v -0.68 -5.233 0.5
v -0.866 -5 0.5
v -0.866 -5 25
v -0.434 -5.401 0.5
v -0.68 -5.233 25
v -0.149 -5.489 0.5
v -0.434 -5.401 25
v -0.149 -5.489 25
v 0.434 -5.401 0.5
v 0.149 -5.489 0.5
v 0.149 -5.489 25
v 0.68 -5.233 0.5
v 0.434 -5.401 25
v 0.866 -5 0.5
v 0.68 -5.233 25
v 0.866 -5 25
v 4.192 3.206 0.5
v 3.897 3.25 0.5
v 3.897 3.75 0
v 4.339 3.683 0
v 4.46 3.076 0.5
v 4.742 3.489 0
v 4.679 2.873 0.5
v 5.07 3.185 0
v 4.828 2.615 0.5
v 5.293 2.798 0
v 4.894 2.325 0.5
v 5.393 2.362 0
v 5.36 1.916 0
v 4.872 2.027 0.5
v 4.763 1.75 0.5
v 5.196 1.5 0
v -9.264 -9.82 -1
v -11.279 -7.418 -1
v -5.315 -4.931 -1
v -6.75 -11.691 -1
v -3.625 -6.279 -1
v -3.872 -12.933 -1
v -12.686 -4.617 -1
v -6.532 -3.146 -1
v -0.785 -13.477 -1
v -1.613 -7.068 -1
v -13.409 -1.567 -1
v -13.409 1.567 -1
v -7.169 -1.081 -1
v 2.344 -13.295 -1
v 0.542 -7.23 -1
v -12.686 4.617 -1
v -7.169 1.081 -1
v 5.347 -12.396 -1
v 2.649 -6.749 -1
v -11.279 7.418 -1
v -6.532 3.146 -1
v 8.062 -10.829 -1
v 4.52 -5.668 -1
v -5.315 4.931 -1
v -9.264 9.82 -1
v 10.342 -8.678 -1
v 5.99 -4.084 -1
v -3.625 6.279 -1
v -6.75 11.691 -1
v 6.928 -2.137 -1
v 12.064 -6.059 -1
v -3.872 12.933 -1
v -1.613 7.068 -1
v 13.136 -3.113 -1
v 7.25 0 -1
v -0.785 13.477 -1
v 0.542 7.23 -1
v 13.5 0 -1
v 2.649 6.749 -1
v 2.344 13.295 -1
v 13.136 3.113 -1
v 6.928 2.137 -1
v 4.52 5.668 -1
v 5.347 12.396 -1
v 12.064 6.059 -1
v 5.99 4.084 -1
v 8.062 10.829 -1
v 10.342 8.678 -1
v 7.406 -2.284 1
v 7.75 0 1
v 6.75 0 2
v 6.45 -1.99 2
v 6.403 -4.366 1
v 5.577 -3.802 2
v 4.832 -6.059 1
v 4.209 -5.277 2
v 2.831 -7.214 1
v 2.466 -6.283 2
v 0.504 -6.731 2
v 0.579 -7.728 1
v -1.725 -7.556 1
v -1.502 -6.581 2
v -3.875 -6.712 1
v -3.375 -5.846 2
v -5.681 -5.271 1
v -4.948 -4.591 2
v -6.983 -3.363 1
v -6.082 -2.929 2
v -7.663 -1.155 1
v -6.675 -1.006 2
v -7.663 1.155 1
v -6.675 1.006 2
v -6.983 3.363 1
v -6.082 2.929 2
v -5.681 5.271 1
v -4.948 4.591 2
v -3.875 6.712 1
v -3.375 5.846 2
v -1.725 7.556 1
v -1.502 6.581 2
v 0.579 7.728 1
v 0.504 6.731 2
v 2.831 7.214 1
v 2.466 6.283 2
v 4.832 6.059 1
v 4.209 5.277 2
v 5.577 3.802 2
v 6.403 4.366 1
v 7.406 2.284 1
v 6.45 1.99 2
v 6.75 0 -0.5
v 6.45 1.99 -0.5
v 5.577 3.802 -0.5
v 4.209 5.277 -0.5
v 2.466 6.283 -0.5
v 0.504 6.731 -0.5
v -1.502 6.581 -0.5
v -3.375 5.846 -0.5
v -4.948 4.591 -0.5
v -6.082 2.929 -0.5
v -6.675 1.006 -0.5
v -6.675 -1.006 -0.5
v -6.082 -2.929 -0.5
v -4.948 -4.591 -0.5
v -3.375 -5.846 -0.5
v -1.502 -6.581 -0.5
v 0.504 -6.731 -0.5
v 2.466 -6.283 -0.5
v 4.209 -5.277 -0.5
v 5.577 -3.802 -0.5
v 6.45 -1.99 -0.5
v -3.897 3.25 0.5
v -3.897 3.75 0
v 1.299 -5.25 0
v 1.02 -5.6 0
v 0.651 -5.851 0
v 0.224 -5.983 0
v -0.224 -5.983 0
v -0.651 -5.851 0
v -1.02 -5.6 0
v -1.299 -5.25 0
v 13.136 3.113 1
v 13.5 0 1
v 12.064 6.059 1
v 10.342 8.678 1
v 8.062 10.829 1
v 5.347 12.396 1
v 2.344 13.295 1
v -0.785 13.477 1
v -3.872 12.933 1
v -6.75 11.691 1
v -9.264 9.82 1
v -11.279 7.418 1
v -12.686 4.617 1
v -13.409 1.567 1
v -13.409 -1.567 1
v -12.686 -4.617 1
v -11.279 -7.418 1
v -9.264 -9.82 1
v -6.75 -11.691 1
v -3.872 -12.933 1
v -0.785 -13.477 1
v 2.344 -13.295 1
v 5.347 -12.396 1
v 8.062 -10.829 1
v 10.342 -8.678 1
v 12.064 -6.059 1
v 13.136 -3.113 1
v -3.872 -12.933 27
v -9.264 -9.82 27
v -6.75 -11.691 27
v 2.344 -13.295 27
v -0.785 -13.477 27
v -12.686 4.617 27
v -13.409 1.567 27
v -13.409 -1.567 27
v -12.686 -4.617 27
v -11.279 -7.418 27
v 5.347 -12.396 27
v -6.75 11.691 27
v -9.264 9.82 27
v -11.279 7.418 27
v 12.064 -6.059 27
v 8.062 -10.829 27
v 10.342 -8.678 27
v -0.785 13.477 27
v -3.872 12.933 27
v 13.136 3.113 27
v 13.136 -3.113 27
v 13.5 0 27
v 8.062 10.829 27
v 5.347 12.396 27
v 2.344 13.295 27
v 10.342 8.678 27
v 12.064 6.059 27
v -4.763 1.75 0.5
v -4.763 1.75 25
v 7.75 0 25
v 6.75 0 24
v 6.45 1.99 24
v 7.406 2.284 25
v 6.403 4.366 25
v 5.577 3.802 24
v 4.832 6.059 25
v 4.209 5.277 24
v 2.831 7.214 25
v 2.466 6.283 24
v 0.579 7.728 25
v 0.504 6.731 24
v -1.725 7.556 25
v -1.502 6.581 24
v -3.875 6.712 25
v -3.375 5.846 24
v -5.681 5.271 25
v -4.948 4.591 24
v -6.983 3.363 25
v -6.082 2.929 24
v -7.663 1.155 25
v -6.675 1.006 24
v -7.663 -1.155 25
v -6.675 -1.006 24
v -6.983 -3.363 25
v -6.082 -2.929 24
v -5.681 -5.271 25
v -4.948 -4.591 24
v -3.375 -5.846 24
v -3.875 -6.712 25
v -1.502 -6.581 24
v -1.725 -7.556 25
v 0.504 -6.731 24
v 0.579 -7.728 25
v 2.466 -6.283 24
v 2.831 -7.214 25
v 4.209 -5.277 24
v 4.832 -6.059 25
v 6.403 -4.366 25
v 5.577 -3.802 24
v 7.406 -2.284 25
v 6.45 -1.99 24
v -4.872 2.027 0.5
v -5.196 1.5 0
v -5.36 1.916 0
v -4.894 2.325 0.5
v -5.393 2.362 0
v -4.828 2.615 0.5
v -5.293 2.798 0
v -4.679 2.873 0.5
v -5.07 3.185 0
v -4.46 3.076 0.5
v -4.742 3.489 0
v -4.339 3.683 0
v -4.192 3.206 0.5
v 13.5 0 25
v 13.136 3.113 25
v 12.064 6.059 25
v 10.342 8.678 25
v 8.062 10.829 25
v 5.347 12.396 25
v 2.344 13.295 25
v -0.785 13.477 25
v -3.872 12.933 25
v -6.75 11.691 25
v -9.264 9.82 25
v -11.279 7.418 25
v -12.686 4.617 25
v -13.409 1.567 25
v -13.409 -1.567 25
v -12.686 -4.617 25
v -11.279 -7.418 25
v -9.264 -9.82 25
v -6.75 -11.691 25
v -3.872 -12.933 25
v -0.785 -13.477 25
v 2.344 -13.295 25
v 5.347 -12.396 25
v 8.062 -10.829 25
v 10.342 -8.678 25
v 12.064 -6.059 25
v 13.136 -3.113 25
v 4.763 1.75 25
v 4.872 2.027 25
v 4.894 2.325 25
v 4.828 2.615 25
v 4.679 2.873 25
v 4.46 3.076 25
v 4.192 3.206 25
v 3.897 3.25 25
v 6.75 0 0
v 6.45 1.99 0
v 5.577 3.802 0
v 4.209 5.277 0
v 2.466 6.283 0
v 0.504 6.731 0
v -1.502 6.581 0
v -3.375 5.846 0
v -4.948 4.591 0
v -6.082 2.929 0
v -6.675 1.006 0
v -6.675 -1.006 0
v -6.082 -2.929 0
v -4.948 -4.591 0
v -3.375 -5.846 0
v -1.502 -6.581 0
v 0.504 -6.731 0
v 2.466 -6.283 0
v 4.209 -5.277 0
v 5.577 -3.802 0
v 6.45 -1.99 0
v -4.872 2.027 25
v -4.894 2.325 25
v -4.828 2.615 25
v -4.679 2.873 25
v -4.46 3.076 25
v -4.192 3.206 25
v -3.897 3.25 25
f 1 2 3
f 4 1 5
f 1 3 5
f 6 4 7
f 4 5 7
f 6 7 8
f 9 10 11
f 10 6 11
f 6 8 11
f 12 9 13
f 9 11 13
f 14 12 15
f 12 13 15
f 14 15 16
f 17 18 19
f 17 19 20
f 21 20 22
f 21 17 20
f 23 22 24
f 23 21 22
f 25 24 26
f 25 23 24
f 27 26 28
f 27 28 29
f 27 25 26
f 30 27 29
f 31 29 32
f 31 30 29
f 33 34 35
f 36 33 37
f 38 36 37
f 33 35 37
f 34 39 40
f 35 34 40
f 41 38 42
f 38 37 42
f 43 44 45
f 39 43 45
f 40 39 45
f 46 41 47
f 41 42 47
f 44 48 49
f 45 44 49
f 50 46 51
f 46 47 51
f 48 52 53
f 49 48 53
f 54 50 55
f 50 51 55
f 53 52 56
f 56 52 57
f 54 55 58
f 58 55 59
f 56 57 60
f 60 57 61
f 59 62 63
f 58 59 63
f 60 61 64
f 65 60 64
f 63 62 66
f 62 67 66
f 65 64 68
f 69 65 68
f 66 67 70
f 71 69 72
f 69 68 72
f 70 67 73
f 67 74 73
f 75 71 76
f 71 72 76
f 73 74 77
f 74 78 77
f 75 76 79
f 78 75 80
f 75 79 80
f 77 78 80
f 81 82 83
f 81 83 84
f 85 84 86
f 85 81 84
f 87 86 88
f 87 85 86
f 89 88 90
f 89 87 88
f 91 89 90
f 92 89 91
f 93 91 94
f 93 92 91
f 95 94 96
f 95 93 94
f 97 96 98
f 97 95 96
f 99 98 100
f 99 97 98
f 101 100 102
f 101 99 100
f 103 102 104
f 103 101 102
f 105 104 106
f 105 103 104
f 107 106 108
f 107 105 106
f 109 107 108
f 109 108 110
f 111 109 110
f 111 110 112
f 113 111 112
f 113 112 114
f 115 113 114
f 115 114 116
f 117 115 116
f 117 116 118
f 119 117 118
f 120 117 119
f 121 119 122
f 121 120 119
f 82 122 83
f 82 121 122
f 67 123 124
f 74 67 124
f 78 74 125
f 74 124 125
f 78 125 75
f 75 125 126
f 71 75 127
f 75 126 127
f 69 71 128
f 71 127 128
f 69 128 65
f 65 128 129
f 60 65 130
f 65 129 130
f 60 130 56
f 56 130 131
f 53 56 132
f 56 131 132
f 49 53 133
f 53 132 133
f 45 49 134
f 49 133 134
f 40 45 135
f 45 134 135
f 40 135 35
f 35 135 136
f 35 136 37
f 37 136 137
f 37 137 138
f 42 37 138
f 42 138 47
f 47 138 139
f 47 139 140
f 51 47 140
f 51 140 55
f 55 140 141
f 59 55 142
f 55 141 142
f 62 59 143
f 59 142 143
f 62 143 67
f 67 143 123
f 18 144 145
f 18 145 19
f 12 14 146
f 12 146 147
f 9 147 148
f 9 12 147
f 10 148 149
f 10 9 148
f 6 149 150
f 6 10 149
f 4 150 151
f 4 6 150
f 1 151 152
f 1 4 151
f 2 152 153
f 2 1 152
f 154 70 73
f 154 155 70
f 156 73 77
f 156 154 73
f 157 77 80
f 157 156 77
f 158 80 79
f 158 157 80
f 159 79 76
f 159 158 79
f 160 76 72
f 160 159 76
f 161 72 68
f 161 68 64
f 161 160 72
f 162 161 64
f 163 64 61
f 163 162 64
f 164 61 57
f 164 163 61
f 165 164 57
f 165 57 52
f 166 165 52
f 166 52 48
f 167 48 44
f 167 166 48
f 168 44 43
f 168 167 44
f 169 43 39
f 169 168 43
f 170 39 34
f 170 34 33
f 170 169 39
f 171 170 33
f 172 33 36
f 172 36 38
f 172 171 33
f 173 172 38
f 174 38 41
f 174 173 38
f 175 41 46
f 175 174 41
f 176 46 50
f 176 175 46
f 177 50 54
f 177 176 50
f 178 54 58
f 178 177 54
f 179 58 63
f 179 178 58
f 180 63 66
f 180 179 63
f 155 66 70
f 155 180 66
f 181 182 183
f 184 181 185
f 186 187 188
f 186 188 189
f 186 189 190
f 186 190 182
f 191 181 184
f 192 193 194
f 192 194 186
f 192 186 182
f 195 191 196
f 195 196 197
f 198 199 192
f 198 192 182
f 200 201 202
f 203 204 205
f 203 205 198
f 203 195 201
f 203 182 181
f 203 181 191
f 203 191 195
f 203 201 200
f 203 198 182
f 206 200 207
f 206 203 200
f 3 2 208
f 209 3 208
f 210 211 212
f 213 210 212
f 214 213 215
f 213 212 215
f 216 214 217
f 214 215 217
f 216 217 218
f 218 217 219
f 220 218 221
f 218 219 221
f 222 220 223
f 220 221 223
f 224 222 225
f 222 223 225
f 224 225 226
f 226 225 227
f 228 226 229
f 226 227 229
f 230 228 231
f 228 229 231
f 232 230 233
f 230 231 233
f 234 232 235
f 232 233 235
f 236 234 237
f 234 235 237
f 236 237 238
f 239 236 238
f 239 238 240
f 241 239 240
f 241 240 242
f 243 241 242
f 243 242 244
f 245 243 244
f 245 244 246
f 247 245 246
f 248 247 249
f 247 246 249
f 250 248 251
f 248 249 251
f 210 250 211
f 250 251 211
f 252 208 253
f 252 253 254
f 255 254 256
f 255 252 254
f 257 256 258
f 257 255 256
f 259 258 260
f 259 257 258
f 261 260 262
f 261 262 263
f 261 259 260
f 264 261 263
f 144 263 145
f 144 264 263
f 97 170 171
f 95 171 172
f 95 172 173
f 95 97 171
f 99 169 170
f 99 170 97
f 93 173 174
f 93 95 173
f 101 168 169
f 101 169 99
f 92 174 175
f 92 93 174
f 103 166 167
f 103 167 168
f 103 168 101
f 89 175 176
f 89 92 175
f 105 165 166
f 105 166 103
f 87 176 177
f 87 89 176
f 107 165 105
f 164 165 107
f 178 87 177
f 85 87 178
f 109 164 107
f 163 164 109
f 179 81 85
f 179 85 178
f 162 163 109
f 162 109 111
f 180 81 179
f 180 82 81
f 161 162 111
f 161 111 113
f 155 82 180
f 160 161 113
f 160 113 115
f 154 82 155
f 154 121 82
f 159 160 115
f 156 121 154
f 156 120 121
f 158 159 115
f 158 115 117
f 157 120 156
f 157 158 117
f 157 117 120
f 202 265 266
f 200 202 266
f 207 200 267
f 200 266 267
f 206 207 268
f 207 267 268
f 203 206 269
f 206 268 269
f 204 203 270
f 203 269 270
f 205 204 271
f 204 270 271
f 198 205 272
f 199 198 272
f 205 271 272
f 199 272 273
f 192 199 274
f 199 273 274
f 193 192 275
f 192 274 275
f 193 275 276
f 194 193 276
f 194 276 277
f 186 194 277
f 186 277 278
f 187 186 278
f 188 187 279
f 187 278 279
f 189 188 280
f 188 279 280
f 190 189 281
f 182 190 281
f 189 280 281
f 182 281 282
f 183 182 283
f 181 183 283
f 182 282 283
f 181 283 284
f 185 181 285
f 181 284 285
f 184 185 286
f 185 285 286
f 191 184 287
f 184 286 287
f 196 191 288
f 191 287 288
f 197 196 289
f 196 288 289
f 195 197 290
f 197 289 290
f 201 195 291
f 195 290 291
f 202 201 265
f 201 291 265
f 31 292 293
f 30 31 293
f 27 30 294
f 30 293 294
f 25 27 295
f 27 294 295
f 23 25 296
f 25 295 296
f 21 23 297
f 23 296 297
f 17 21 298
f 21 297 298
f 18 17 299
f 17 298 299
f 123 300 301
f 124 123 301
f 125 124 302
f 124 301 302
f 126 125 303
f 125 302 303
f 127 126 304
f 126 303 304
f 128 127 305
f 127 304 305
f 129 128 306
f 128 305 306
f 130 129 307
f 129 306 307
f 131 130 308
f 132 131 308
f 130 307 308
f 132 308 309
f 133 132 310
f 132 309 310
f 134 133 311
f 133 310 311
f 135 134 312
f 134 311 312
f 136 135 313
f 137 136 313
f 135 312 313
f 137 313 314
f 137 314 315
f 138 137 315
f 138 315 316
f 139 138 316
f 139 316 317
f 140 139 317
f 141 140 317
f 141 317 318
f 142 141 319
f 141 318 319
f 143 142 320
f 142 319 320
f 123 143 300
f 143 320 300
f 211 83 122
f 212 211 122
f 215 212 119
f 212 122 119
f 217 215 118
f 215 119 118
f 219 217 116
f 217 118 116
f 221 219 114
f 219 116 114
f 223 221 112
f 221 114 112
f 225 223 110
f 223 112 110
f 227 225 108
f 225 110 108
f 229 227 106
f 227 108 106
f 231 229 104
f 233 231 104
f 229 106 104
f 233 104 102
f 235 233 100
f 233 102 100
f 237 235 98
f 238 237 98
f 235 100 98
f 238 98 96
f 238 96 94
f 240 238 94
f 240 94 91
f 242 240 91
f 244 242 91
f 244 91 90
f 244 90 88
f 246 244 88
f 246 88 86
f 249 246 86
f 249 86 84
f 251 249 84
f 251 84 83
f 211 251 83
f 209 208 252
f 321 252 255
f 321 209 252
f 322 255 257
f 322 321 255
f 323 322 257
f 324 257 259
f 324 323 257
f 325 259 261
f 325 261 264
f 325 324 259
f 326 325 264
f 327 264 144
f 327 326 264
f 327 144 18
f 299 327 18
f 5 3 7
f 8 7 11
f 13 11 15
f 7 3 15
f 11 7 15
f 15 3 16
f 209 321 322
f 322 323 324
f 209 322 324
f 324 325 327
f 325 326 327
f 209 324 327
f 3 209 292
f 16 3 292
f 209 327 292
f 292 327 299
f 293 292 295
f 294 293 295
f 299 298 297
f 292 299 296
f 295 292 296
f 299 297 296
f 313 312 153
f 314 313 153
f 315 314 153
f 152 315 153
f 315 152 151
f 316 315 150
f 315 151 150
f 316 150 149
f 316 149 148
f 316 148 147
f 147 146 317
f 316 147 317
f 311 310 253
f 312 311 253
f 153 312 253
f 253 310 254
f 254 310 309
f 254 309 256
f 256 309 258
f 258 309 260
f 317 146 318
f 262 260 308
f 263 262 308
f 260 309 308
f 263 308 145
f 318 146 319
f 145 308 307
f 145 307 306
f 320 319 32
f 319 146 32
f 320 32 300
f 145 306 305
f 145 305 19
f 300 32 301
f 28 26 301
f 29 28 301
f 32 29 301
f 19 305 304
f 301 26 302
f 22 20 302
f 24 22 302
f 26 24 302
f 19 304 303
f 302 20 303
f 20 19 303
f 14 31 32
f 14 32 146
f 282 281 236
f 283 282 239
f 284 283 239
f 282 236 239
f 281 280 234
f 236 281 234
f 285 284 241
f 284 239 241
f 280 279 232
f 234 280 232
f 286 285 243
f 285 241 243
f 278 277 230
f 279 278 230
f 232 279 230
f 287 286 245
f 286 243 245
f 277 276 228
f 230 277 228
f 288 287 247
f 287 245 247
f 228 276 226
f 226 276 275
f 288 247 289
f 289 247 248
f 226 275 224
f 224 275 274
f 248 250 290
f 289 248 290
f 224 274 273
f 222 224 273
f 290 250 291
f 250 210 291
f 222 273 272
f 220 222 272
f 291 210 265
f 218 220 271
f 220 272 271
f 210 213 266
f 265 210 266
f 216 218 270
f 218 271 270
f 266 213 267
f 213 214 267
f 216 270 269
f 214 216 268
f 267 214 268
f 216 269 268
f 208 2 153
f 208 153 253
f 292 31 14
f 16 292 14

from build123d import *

# Parameters (mm, degrees)
SKETCH_R        = 13.5
SKETCH_R_2      = 6.75
PAD_DEPTH       = 1
SKETCH001_R     = 13.5
PAD001_DEPTH    = 1
SKETCH002_R     = 6.75
PAD002_DEPTH    = 25
POCKET_DEPTH    = 30
FILLET_R        = 1
SKETCH004_R     = 13.5
PAD003_DEPTH    = 2
CHAMFER_SIZE    = 1
CHAMFER001_SIZE = 0.5
CHAMFER002_SIZE = 0.5


with BuildPart() as part:
    # Sketch → Pad (new body)
    with BuildSketch(Plane.XY):
        Circle(SKETCH_R)
        Circle(SKETCH_R_2, mode=Mode.SUBTRACT)
    extrude(amount=-PAD_DEPTH)

    # Sketch001 → Pad001 (join)
    with BuildSketch(Plane.XY):
        Circle(SKETCH001_R)
    extrude(amount=PAD001_DEPTH)

    # Sketch002 → Pad002 (join)
    with BuildSketch(Plane.XY):
        Circle(SKETCH002_R)
    extrude(amount=PAD002_DEPTH)

    # Sketch003 → Pocket (cut)
    with BuildSketch(Plane.XY):
        Polygon((-5.629165, 3.25), (5.629165, 3.25), (0, -6.5), align=None)
    extrude(amount=POCKET_DEPTH, mode=Mode.SUBTRACT)

    # Fillet
    fillet_edges = [part.edges().sort_by_distance(p)[0] for p in [
        (5.629165, 3.25, 12.5),
        (-5.629165, 3.25, 12.5),
        (0, -6.5, 12.5),
    ]]
    fillet(fillet_edges, radius=FILLET_R)

    # Sketch004 (on DatumPlane) → Pad003 (join)
    with BuildSketch(Plane.XY.offset(25)):
        Circle(SKETCH004_R)
    extrude(amount=PAD003_DEPTH)

    # Chamfer
    chamfer_edges = [part.edges().sort_by_distance(p)[0] for p in [
        (-6.75, 0, 1),
        (-6.75, 0, 25),
    ]]
    chamfer(chamfer_edges, length=CHAMFER_SIZE)

    # Chamfer001
    chamfer001_edges = [part.edges().sort_by_distance(p)[0] for p in [
        (-6.75, 0, -1),
    ]]
    chamfer(chamfer001_edges, length=CHAMFER001_SIZE)

    # Chamfer002
    chamfer002_edges = [part.edges().sort_by_distance(p)[0] for p in [
        (2.814583, -1.625, 0),
    ]]
    chamfer(chamfer002_edges, length=CHAMFER002_SIZE)


solid = part.part
